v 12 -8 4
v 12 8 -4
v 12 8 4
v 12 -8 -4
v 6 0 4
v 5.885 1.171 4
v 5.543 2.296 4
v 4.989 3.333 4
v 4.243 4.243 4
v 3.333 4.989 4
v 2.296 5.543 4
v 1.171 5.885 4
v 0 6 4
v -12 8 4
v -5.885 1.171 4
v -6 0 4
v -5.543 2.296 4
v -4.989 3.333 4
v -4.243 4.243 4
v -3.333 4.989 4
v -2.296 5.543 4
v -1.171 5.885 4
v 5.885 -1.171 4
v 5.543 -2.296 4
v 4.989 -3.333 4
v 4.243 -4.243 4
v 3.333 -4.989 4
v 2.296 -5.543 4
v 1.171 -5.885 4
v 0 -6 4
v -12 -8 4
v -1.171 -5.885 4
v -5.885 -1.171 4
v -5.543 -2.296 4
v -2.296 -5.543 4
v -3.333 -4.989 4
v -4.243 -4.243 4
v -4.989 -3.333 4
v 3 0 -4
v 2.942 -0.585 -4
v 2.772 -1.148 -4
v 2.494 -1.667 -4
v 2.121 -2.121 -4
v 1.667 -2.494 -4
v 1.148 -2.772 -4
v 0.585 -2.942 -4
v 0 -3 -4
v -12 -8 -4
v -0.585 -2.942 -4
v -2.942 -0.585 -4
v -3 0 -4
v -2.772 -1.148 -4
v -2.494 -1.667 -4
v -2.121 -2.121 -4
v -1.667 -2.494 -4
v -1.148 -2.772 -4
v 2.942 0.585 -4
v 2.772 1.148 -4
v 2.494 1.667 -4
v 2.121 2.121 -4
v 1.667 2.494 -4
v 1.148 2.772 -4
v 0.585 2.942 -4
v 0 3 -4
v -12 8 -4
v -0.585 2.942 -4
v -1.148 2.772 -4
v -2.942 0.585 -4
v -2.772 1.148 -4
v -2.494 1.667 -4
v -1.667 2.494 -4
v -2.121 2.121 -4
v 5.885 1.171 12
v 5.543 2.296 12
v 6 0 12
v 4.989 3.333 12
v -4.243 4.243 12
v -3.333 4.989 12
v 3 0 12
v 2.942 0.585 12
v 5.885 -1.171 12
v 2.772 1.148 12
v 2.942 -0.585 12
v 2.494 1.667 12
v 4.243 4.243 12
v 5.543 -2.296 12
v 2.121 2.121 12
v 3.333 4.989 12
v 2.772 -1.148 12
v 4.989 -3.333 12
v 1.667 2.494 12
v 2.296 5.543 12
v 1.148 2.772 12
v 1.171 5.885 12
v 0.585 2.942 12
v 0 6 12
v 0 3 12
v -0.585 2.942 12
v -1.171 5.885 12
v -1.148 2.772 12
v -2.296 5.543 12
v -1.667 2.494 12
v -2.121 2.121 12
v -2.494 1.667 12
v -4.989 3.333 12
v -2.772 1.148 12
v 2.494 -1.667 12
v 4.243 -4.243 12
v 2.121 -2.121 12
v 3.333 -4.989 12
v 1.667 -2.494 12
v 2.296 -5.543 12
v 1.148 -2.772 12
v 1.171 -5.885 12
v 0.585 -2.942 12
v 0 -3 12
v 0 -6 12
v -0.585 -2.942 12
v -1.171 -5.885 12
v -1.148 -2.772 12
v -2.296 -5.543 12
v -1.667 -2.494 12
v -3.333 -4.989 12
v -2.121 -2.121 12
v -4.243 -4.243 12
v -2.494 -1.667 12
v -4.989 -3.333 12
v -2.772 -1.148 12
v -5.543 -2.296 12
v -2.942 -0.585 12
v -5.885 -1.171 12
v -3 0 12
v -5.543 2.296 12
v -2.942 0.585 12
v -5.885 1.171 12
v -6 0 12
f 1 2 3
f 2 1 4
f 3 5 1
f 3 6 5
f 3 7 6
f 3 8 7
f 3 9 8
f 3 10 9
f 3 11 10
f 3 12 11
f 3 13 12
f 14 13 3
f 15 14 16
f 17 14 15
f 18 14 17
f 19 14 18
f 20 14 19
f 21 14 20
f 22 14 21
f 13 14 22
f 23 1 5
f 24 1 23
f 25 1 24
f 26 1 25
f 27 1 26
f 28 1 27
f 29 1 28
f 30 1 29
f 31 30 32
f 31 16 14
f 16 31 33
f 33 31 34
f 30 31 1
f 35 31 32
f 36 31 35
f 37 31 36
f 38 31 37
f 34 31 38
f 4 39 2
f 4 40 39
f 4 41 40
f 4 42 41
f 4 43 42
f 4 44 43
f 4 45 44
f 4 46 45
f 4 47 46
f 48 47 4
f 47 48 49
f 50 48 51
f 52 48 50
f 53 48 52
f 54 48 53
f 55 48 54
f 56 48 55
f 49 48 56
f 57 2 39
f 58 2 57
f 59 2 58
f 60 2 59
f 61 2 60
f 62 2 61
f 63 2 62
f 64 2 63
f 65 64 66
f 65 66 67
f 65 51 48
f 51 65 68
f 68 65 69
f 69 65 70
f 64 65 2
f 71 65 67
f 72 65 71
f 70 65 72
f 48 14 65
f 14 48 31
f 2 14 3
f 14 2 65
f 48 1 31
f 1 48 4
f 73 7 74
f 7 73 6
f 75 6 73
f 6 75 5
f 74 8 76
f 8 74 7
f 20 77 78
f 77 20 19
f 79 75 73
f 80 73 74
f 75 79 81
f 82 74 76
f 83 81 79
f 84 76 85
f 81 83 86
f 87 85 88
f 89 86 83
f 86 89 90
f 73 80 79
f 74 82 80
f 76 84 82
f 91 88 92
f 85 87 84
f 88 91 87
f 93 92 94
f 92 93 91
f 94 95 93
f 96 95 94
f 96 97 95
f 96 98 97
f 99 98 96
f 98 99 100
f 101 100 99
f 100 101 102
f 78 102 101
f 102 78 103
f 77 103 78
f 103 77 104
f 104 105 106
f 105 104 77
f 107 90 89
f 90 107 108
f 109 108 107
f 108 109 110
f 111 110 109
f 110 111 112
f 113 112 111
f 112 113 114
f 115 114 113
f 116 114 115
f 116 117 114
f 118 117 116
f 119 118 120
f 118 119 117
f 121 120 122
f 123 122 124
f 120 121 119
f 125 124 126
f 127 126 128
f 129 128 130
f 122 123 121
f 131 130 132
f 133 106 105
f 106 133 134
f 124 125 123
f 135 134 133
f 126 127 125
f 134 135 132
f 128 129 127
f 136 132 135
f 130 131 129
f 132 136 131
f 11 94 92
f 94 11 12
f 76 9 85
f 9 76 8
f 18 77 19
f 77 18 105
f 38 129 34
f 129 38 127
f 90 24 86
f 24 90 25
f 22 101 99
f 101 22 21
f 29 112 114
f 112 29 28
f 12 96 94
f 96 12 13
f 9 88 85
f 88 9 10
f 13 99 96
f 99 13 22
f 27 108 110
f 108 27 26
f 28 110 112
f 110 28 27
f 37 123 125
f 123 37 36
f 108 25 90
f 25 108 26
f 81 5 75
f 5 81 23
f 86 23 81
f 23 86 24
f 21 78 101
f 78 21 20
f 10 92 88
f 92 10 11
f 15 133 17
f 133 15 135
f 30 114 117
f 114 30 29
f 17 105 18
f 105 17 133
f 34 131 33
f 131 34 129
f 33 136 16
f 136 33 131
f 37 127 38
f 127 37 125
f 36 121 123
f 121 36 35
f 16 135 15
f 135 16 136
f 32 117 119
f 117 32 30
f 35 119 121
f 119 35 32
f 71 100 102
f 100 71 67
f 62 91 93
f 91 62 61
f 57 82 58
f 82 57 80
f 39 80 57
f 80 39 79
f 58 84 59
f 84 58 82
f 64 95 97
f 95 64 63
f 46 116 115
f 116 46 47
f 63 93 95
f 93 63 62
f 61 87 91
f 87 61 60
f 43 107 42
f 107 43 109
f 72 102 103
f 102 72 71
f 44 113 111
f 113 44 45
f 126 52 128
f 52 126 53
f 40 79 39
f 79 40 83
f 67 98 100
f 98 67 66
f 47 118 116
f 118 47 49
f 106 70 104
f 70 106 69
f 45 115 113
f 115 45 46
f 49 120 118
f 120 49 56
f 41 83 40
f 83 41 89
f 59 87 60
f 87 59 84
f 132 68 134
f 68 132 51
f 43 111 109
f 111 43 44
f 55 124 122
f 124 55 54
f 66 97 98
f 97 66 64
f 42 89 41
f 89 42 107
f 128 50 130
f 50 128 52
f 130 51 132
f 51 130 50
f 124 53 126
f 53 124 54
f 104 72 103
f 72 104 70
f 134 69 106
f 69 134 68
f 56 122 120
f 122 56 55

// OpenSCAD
difference() {
  union() {
    cube([24, 16, 8], center = true);
    translate([0, 0, 4]) cylinder(h = 8, r = 6, $fn = 32);
  }
  cylinder(h = 40, r = 3, center = true, $fn = 32);
}
